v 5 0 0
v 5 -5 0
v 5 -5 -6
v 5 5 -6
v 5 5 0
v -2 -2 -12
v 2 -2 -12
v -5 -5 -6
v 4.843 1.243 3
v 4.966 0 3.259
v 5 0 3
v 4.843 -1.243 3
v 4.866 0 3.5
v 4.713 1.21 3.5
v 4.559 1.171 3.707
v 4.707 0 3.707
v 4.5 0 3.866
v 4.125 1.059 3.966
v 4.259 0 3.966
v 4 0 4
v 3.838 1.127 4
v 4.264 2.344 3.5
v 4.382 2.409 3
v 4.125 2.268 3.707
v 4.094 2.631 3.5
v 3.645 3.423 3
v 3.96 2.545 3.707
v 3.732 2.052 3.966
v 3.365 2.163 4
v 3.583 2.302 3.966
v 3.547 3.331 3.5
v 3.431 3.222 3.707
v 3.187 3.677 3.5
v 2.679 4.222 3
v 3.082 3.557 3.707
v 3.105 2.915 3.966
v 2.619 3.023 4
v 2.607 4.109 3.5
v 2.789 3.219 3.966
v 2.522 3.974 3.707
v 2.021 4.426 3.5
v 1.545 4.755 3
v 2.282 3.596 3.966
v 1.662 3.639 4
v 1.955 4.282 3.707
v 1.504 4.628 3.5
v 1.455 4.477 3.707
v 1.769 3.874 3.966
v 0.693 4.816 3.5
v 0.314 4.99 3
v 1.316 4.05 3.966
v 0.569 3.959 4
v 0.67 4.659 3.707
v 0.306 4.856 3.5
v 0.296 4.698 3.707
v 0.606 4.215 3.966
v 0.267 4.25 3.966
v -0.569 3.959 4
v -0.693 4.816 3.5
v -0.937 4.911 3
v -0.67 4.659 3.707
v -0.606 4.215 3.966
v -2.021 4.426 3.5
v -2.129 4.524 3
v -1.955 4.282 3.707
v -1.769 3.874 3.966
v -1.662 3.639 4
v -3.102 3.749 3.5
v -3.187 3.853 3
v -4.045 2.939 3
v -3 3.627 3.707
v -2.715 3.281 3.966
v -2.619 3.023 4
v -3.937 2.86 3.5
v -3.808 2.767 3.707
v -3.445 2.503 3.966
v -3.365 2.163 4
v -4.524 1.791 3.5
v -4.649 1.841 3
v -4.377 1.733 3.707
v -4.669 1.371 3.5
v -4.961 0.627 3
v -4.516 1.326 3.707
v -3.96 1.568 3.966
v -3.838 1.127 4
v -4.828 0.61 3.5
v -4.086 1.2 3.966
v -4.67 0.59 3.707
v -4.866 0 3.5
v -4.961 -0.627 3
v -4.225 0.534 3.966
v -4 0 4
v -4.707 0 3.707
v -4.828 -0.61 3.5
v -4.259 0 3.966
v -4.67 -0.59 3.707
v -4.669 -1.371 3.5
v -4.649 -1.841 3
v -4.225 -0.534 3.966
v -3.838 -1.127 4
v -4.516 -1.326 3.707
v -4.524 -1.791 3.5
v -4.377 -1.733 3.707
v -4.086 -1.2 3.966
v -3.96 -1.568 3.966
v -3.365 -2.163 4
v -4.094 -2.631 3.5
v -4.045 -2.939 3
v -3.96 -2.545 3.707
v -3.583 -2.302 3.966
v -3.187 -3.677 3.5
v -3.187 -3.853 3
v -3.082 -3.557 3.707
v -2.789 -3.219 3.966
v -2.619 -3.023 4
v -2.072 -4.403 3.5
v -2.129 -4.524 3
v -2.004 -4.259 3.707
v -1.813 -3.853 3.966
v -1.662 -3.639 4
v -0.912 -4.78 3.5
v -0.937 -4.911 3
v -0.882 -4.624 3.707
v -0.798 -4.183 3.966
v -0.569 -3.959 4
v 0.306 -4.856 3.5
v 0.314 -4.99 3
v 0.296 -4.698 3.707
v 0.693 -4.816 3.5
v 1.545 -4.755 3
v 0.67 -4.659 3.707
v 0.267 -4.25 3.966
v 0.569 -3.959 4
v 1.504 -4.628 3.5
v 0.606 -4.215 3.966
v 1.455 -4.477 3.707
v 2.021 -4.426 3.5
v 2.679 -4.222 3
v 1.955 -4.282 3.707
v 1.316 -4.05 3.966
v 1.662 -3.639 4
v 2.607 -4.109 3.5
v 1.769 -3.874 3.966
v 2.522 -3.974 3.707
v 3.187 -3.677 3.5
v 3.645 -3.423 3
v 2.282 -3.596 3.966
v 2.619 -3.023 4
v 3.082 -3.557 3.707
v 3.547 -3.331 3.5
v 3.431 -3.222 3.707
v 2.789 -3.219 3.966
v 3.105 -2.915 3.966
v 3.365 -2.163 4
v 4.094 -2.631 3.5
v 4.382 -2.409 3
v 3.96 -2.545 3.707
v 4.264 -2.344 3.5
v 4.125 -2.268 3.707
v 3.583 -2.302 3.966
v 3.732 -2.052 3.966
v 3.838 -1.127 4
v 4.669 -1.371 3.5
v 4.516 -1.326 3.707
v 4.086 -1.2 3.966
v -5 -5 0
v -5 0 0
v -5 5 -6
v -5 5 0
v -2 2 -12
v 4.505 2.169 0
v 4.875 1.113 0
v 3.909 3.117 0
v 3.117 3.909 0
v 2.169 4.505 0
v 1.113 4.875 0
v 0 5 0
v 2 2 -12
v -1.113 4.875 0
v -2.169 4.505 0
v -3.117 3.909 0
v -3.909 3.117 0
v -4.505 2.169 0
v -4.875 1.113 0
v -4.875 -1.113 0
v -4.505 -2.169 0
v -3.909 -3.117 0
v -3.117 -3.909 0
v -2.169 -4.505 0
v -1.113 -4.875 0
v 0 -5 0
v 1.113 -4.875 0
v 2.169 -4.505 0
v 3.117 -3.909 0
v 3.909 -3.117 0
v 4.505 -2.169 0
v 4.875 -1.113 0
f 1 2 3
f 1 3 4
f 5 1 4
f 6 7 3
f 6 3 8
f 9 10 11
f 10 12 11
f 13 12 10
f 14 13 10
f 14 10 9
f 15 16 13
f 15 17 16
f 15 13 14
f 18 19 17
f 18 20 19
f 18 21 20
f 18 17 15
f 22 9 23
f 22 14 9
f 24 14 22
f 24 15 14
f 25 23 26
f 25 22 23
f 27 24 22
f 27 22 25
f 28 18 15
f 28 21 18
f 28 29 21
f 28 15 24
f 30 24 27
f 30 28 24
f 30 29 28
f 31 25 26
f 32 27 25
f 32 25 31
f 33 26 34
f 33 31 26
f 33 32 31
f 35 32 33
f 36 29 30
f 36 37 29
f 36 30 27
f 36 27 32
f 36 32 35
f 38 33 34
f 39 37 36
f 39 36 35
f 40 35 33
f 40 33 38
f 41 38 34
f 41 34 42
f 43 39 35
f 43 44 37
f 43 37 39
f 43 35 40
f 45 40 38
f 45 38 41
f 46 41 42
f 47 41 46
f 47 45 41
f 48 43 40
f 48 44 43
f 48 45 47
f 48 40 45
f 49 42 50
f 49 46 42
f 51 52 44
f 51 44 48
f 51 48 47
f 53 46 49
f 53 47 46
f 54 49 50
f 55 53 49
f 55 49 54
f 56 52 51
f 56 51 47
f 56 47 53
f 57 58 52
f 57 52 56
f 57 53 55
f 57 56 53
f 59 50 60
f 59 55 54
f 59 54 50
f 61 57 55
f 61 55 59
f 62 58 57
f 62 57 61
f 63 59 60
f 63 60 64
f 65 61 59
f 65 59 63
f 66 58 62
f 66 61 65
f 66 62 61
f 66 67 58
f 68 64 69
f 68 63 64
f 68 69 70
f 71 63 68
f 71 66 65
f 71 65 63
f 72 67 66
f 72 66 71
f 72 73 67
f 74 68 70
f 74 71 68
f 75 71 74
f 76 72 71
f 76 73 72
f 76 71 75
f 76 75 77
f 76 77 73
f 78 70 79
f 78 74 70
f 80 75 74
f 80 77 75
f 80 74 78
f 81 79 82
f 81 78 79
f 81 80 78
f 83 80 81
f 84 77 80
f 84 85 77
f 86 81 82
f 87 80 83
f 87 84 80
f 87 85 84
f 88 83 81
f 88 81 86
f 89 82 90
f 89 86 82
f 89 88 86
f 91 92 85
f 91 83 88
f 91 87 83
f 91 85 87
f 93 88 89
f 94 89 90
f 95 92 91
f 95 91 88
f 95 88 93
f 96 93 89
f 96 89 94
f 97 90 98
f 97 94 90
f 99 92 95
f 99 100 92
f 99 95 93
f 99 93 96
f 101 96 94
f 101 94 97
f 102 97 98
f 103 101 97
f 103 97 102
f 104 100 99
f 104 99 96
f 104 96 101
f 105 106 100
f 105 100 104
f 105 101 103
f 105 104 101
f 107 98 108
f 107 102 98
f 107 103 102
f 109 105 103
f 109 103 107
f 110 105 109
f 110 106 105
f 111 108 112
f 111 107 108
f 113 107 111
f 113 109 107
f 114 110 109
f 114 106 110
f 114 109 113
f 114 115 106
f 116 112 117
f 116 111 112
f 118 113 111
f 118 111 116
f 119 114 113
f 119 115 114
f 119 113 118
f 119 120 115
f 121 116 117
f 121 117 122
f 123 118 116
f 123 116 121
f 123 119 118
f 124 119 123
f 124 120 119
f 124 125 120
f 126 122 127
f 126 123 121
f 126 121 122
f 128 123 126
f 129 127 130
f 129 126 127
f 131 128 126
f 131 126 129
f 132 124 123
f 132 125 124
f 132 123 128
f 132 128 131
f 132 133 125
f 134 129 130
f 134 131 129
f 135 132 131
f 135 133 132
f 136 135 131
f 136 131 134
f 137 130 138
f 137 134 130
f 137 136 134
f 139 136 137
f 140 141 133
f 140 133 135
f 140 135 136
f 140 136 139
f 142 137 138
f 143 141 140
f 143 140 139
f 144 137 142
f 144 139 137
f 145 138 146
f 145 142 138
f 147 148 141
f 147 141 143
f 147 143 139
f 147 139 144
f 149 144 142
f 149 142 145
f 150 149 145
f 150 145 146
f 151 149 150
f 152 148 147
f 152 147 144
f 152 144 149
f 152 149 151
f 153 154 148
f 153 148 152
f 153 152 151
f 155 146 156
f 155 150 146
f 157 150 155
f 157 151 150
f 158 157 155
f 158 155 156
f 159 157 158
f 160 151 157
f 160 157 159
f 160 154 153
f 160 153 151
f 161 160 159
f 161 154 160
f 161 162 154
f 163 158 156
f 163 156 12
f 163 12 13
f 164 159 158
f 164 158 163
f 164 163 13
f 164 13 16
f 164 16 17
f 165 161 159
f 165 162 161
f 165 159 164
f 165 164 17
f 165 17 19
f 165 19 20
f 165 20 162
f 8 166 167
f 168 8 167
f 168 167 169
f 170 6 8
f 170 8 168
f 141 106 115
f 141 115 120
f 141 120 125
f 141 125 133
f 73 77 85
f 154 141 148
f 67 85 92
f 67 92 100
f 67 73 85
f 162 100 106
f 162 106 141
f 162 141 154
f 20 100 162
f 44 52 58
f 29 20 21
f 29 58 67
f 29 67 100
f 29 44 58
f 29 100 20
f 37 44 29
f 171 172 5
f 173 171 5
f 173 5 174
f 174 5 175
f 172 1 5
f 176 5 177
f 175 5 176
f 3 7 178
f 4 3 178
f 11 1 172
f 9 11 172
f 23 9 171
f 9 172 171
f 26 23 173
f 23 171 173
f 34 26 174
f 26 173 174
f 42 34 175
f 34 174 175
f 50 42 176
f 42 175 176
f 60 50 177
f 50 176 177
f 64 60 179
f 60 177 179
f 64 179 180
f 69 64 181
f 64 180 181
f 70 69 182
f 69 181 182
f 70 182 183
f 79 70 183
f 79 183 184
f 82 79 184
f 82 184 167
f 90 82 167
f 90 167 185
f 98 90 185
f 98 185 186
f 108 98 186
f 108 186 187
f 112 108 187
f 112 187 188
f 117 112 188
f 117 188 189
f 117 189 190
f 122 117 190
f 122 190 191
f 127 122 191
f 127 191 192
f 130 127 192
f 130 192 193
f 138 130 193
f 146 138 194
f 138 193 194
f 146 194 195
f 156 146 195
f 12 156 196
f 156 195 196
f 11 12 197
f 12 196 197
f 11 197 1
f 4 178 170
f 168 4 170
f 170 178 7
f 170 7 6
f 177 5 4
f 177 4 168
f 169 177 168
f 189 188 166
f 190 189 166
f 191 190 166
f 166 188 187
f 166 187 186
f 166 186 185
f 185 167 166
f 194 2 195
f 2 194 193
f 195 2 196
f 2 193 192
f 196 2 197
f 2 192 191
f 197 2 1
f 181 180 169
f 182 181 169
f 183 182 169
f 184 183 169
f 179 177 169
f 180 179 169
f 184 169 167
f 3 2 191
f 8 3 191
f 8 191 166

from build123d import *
from OCP.BRepFilletAPI import BRepFilletAPI_MakeChamfer

# Parameters (mm, degrees)
SCHIZZO1_R                   = 5
ESTRUSIONE_ESTRUSIONE1_DEPTH = 4
SCHIZZO2_W                   = 10
SCHIZZO2_H                   = 10
ESTRUSIONE_ESTRUSIONE2_DEPTH = 12
RACCORDO1_R                  = 1
SMUSSO1_SIZE                 = 6
SMUSSO1_SIZE2                = 3


with BuildPart() as part:
    # Schizzo1 → Estrusione-Estrusione1 (new body)
    with BuildSketch(Plane.XY):
        Circle(SCHIZZO1_R)
    extrude(amount=ESTRUSIONE_ESTRUSIONE1_DEPTH)

    # Schizzo2 → Estrusione-Estrusione2 (add)
    with BuildSketch(Plane(origin=(0, 0, 0), x_dir=(-1, 0, 0), z_dir=(0, 0, -1))):
        Rectangle(SCHIZZO2_W, SCHIZZO2_H)
    extrude(amount=ESTRUSIONE_ESTRUSIONE2_DEPTH)

    # Raccordo1
    raccordo1_edges = [part.edges().sort_by_distance(p)[0] for p in [
        (-5, 0, 4),
    ]]
    fillet(raccordo1_edges, radius=RACCORDO1_R)

    # Smusso1: one chamfer whose edges measure the first distance from different faces: ONE call of the kernel's chamfer builder (chamfer() names one face for all edges)
    smusso1_edges_1 = [part.edges().sort_by_distance(p)[0] for p in [
        (0, 5, -12),
    ]]
    smusso1_side_1 = [part.faces().sort_by_distance(p)[0] for p in [
        (0, 5, -6),
    ]]
    smusso1_edges_2 = [part.edges().sort_by_distance(p)[0] for p in [
        (5, 0, -12),
    ]]
    smusso1_side_2 = [part.faces().sort_by_distance(p)[0] for p in [
        (5, 0, -6),
    ]]
    smusso1_edges_3 = [part.edges().sort_by_distance(p)[0] for p in [
        (0, -5, -12),
    ]]
    smusso1_side_3 = [part.faces().sort_by_distance(p)[0] for p in [
        (0, -5, -6),
    ]]
    smusso1_edges_4 = [part.edges().sort_by_distance(p)[0] for p in [
        (-5, 0, -12),
    ]]
    smusso1_side_4 = [part.faces().sort_by_distance(p)[0] for p in [
        (-5, 0, -6),
    ]]
    smusso1 = BRepFilletAPI_MakeChamfer(part.part.solid().wrapped)
    for e in smusso1_edges_1:
        smusso1.Add(SMUSSO1_SIZE, SMUSSO1_SIZE2, e.wrapped, smusso1_side_1[0].wrapped)  # the first distance lies on this face
    for e in smusso1_edges_2:
        smusso1.Add(SMUSSO1_SIZE, SMUSSO1_SIZE2, e.wrapped, smusso1_side_2[0].wrapped)  # the first distance lies on this face
    for e in smusso1_edges_3:
        smusso1.Add(SMUSSO1_SIZE, SMUSSO1_SIZE2, e.wrapped, smusso1_side_3[0].wrapped)  # the first distance lies on this face
    for e in smusso1_edges_4:
        smusso1.Add(SMUSSO1_SIZE, SMUSSO1_SIZE2, e.wrapped, smusso1_side_4[0].wrapped)  # the first distance lies on this face
    add(Compound.cast(smusso1.Shape()), mode=Mode.REPLACE)


solid = part.part
